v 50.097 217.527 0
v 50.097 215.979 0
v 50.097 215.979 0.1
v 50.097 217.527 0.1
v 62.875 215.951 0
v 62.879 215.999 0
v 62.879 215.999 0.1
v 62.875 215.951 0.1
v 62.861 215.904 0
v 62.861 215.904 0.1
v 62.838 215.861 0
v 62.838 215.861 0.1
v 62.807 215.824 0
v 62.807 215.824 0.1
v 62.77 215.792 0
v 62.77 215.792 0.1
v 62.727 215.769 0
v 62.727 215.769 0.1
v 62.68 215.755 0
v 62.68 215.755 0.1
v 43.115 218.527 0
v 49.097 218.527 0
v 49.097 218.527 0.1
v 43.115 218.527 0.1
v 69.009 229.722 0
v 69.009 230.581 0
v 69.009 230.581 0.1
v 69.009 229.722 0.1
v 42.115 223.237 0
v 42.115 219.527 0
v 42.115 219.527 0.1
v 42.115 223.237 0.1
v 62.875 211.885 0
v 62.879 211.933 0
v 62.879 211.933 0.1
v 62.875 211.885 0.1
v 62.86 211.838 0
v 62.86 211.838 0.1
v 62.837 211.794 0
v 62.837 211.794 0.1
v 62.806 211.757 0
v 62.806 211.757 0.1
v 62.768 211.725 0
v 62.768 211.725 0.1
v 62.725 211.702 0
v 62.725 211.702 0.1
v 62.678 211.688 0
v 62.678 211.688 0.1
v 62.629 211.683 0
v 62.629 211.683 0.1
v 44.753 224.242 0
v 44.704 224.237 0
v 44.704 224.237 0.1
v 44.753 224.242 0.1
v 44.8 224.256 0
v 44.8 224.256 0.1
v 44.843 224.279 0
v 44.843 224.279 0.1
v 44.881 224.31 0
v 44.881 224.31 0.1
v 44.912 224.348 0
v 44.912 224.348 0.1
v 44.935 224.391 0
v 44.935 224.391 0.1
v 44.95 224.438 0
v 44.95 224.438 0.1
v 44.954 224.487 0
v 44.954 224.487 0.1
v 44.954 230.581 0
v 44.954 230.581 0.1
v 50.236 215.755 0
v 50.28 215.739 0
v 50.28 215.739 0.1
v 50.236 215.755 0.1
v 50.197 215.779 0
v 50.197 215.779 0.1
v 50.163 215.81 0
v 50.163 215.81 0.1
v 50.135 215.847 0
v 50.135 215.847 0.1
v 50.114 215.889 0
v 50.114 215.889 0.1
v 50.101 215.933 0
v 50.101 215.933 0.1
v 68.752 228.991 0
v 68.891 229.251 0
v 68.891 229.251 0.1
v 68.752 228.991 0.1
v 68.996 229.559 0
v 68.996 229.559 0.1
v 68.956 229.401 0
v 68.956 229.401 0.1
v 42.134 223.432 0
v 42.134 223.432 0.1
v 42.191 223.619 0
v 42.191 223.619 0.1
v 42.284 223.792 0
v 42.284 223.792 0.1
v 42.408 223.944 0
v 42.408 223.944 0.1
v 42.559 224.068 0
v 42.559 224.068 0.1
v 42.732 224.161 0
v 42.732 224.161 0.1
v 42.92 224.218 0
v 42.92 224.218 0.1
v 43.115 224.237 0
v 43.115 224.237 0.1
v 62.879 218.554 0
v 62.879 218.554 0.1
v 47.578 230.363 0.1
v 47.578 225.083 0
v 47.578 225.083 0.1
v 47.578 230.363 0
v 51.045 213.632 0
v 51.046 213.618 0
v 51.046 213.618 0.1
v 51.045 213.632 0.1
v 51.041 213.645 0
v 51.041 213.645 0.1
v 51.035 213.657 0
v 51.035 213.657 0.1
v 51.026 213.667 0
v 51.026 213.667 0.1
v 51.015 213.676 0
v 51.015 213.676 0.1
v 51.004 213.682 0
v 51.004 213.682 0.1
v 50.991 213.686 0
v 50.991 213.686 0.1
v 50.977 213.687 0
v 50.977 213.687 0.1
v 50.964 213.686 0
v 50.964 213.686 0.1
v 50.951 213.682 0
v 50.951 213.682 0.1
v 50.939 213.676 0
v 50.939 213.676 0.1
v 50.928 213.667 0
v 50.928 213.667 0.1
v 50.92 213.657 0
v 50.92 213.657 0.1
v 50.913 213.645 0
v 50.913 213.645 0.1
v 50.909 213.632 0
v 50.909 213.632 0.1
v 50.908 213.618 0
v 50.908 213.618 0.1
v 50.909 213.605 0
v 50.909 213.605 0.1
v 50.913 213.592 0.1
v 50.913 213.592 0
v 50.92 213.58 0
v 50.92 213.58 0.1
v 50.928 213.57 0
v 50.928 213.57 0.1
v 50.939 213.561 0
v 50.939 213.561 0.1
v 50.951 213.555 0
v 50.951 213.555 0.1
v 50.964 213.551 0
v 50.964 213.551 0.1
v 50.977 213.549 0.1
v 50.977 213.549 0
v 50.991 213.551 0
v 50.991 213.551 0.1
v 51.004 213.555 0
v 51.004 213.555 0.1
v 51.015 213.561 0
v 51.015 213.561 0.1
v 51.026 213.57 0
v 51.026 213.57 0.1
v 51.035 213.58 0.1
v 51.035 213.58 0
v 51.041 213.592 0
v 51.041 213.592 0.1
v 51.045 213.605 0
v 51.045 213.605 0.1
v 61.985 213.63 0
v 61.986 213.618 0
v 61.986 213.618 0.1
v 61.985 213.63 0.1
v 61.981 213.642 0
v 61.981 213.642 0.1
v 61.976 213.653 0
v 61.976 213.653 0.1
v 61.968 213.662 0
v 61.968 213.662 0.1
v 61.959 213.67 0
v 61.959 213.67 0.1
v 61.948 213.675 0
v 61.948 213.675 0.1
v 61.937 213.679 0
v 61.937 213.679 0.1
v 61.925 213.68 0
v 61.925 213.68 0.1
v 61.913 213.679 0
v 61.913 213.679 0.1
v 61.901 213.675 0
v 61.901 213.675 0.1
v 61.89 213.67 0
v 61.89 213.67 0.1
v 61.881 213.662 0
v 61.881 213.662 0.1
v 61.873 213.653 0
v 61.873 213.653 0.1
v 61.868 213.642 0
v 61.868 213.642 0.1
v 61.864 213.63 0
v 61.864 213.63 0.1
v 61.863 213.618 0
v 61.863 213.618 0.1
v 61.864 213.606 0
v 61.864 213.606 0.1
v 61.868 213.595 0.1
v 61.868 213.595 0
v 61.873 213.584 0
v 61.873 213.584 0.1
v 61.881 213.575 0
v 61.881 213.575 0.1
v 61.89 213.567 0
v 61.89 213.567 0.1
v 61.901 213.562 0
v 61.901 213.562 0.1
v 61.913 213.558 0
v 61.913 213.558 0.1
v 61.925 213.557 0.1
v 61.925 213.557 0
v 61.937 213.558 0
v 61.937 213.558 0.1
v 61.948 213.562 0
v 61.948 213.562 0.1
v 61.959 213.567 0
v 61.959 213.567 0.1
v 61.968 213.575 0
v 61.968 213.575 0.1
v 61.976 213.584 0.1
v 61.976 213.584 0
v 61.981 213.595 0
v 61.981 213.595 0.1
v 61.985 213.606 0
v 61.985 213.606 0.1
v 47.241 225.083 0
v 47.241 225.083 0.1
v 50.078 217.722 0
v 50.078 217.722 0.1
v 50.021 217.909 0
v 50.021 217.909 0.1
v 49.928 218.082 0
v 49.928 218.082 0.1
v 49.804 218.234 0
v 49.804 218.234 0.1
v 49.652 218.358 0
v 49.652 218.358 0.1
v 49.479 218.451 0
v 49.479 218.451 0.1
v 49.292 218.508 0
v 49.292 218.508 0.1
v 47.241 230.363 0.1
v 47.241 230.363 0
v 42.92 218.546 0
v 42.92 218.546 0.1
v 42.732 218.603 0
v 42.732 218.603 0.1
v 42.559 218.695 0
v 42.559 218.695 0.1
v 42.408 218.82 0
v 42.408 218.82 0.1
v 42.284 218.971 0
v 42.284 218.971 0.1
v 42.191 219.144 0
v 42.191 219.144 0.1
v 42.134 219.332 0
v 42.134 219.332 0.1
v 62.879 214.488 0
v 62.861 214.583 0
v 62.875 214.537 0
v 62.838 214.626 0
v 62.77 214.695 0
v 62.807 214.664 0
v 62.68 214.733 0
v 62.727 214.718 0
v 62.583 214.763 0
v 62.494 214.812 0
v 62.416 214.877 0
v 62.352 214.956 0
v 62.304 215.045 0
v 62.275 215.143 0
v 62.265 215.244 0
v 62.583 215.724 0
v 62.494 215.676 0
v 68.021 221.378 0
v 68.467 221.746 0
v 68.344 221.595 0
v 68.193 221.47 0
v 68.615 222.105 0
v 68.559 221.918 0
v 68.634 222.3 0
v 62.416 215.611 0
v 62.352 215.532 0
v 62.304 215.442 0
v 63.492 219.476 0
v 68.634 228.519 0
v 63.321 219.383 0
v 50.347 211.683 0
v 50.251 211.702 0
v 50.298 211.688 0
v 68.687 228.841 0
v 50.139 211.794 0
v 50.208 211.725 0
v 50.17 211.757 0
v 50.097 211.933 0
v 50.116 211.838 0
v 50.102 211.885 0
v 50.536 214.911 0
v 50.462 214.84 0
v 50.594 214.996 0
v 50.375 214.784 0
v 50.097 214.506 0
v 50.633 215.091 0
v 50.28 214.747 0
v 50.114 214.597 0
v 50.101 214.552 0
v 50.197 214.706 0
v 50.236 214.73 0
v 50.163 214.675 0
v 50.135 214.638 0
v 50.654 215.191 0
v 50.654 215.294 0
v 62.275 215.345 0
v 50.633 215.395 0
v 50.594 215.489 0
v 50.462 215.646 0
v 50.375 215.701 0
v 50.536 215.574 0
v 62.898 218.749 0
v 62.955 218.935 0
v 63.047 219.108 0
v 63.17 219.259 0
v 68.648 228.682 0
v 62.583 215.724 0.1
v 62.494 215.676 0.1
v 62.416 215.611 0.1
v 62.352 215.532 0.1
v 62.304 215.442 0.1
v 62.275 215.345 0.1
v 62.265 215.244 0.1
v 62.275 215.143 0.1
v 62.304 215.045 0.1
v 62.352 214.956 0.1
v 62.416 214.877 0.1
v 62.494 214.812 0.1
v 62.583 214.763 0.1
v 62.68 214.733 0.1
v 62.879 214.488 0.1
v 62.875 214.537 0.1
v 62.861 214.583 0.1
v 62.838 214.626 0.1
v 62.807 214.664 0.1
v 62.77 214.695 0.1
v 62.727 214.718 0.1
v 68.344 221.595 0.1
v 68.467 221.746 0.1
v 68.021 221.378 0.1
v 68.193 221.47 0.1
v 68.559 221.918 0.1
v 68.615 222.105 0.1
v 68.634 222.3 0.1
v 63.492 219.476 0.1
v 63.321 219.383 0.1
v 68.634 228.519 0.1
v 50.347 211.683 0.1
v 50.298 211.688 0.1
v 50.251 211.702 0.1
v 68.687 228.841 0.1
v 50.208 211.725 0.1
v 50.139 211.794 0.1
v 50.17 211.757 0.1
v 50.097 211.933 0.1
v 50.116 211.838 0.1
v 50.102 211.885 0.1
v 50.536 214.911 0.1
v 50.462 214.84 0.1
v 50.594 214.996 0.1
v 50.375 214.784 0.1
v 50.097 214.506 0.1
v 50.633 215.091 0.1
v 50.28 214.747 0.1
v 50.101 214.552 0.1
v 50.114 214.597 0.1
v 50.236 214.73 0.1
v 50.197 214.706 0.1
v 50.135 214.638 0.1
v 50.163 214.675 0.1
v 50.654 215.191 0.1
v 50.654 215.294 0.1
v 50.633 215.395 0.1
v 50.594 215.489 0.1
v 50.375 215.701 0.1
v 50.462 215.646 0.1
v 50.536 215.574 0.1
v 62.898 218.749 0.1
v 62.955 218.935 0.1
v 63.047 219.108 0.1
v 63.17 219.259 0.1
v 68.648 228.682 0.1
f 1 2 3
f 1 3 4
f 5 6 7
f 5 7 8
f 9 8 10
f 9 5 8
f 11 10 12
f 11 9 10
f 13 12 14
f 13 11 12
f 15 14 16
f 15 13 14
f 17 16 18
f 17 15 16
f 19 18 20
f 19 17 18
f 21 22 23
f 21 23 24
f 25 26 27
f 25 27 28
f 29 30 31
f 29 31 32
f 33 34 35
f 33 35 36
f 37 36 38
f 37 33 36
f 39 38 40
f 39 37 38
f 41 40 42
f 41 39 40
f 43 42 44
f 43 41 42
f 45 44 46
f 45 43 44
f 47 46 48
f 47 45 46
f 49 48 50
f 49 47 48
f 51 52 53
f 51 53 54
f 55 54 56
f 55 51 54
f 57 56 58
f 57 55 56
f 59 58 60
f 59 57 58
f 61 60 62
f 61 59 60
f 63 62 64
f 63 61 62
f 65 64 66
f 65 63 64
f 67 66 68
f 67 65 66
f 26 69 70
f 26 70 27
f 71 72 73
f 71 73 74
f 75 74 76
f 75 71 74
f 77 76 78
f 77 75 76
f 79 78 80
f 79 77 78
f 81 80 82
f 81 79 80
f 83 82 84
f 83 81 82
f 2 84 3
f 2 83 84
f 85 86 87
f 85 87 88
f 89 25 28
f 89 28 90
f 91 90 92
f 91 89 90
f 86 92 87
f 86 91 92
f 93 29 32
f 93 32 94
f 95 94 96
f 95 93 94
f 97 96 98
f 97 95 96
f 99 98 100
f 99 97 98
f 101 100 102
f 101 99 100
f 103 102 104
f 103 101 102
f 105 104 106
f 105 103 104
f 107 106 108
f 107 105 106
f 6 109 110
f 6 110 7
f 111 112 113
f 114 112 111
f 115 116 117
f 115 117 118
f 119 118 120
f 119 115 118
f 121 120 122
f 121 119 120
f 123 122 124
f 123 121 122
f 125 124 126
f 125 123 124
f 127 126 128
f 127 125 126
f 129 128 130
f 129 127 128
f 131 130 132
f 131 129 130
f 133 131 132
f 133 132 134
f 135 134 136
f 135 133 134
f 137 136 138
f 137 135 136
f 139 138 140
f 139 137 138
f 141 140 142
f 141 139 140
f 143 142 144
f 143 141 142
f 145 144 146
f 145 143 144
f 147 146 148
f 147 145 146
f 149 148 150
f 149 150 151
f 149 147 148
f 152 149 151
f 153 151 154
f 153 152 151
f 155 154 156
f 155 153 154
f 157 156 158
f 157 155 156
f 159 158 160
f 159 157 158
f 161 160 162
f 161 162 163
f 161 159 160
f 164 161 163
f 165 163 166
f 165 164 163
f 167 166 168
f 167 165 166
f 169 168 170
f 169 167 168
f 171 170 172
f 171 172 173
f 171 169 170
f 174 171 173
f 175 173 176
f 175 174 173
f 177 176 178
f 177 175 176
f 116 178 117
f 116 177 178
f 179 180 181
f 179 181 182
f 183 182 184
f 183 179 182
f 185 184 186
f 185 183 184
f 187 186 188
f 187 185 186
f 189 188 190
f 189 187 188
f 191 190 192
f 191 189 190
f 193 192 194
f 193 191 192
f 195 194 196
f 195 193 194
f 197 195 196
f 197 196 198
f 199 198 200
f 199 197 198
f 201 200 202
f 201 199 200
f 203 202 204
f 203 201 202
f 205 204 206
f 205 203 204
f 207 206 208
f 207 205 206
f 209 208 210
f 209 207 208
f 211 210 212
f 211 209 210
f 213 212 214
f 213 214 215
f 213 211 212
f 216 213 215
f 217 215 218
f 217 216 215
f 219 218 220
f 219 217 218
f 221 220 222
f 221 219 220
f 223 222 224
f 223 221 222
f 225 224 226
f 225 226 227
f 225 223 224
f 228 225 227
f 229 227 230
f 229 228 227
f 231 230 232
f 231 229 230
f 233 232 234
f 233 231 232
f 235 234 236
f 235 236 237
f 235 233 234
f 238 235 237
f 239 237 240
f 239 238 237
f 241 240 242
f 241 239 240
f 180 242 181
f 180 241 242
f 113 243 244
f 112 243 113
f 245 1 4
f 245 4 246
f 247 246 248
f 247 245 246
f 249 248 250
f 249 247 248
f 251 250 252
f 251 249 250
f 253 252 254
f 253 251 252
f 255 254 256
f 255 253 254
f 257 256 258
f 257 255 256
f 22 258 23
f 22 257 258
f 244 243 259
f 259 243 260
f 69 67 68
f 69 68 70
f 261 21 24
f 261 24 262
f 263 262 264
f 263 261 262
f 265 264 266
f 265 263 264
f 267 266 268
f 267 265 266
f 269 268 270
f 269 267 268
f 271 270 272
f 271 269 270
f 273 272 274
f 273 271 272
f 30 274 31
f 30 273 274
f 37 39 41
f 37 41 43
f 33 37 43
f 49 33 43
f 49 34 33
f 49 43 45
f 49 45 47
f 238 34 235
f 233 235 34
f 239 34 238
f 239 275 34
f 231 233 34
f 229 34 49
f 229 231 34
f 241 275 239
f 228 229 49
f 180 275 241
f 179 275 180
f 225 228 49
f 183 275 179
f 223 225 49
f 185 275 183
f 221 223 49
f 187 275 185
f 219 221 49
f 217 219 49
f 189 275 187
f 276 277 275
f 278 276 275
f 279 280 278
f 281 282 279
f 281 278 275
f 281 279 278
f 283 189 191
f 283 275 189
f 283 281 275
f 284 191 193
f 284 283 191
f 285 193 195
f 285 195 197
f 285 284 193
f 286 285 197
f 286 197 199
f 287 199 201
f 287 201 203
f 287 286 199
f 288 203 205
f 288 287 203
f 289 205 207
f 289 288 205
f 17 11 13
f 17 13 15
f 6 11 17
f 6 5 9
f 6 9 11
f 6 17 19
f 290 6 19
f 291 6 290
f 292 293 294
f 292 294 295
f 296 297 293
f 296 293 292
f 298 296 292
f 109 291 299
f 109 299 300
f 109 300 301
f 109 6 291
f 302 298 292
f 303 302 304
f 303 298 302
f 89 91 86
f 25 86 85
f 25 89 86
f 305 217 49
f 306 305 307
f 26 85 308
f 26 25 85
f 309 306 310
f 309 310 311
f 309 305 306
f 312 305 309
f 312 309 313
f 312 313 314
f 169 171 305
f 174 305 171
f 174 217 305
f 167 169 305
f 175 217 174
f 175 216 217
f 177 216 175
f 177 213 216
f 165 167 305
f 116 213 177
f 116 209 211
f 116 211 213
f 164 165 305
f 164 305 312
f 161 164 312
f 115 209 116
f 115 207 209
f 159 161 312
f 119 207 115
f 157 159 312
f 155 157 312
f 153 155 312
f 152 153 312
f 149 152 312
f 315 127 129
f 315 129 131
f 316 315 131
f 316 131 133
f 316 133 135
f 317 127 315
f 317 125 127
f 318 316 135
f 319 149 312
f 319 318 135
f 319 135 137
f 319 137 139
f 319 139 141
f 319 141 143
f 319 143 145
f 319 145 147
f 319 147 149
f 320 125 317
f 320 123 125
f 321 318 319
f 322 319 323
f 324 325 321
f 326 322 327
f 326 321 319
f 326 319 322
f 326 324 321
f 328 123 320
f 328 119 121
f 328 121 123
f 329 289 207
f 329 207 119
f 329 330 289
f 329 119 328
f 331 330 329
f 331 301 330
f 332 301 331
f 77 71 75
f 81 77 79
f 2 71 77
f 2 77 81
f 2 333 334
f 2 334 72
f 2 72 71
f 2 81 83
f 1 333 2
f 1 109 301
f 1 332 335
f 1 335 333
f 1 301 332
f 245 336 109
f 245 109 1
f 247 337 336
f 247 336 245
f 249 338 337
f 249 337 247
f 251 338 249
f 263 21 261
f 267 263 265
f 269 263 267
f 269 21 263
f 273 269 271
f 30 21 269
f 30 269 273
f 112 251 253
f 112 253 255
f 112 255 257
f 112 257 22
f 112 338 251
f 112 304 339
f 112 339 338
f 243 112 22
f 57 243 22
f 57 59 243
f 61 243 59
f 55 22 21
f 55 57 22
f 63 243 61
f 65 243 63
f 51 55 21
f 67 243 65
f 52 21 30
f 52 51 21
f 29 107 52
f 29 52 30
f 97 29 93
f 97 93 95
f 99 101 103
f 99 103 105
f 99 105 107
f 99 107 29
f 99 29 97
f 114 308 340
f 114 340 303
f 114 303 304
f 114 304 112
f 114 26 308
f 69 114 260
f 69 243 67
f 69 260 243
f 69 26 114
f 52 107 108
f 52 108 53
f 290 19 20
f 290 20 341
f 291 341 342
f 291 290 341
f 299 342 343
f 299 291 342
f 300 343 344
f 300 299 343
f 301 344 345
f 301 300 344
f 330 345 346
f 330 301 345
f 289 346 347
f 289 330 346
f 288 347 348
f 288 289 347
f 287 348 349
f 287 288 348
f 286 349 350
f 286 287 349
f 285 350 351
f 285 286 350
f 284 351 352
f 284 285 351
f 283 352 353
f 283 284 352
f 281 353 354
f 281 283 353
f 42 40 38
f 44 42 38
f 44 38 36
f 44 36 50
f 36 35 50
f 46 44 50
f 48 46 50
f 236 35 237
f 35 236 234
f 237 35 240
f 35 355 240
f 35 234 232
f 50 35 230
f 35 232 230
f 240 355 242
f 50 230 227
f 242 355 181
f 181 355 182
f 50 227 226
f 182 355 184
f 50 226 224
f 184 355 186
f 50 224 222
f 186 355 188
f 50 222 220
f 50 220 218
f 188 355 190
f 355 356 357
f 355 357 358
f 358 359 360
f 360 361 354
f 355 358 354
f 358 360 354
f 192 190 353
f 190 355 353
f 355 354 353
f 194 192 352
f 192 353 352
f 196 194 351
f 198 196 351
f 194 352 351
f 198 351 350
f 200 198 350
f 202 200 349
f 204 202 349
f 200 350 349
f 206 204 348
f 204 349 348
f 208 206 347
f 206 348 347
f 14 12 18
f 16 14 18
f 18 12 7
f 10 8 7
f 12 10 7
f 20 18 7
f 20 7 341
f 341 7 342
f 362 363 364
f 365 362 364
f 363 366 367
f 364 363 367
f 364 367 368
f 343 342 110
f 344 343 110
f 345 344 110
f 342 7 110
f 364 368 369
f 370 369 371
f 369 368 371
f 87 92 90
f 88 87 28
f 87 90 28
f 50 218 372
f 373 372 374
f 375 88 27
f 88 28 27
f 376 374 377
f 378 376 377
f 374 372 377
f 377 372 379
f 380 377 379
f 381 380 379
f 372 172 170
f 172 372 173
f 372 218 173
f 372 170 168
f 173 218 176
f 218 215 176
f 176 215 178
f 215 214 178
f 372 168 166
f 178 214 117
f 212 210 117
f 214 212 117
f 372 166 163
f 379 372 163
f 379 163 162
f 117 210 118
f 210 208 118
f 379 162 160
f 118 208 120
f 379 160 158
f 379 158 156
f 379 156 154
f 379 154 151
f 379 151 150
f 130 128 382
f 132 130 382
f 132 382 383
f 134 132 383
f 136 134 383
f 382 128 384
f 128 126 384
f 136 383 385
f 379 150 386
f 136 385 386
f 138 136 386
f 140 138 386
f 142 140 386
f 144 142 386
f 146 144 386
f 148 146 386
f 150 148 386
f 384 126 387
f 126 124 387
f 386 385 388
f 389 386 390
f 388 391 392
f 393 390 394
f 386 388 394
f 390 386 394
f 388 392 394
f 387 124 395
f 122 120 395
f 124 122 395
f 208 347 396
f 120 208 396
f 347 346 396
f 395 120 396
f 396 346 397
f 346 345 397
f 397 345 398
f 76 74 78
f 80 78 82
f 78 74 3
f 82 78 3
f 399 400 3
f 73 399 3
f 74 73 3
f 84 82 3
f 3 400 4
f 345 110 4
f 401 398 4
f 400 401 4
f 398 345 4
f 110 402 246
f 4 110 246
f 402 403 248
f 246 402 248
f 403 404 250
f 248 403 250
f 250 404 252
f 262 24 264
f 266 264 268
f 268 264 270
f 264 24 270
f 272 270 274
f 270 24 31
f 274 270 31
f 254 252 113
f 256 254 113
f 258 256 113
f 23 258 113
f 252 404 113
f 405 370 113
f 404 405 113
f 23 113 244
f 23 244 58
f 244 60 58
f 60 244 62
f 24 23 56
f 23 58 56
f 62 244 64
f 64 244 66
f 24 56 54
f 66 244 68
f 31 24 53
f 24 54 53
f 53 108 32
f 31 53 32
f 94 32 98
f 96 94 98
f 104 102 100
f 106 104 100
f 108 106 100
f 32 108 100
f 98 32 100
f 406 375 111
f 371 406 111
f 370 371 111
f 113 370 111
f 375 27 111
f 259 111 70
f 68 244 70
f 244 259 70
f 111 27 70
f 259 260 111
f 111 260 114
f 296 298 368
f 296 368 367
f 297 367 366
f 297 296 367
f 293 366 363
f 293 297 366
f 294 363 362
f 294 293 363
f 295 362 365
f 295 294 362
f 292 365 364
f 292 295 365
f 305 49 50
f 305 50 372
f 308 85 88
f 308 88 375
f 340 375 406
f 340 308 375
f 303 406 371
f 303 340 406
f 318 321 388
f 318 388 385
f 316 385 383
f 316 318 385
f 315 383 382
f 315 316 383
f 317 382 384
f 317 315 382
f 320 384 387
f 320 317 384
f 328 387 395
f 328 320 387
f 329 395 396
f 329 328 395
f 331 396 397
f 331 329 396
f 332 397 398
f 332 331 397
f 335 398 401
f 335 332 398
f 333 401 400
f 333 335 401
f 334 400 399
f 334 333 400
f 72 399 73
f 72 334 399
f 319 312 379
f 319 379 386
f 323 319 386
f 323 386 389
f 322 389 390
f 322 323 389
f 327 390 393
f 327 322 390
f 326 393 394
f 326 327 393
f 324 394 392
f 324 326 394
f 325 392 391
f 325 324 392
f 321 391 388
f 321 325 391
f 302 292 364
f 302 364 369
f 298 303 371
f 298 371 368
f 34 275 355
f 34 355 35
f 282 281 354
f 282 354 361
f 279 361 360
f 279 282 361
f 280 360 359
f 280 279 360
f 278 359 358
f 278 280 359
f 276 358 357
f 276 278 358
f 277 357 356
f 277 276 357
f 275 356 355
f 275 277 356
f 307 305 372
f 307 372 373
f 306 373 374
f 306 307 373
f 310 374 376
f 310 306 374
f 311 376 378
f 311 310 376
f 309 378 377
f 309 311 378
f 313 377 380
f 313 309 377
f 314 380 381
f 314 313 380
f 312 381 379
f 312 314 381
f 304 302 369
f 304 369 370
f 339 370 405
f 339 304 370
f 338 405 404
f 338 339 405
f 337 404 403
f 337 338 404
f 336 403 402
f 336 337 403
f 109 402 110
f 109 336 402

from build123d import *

# Parameters (mm, degrees)
ESQUISSE1_R        = 0.068980455
ESQUISSE1_R_2      = 0.06150295
ESQUISSE1_W        = 0.337022694
ESQUISSE1_H        = 5.280022209
BOSS_EXTRU_1_DEPTH = 0.1


with BuildPart() as part:
    # Esquisse1 → Boss.-Extru.1 (new body)
    with BuildSketch(Plane.XY):
        with BuildLine():
            Line((69.009405392, 230.580792913), (69.009405392, 229.722196339))
            ThreePointArc((69.009405392, 229.722196339), (68.979401433, 229.479075631), (68.891190034, 229.250544089))
            Line((68.891190034, 229.250544089), (68.752437477, 228.991137135))
            ThreePointArc((68.752437477, 228.991137135), (68.664226077, 228.762605593), (68.634222119, 228.519484885))
            Line((68.634222119, 228.519484885), (68.634222119, 222.299593089))
            ThreePointArc((68.634222119, 222.299593089), (68.467011491, 221.746003113), (68.021298395, 221.377545392))
            Line((68.021298395, 221.377545392), (63.492336438, 219.476283954))
            ThreePointArc((63.492336438, 219.476283954), (63.046623342, 219.107826233), (62.879412715, 218.554236256))
            Line((62.879412715, 218.554236256), (62.879412715, 215.999425613))
            ThreePointArc((62.879412715, 215.999425613), (62.823397918, 215.841724183), (62.680454788, 215.754691662))
            ThreePointArc((62.680454788, 215.754691662), (62.265082422, 215.243750871), (62.680454788, 214.732810081))
            ThreePointArc((62.680454788, 214.732810081), (62.823397918, 214.645777559), (62.879412715, 214.48807613))
            Line((62.879412715, 214.48807613), (62.879412715, 211.933337892))
            ThreePointArc((62.879412715, 211.933337892), (62.80618941, 211.756561196), (62.629412715, 211.683337892))
            Line((62.629412715, 211.683337892), (50.34681626, 211.683337892))
            ThreePointArc((50.34681626, 211.683337892), (50.170039564, 211.756561196), (50.09681626, 211.933337892))
            Line((50.09681626, 211.933337892), (50.09681626, 214.506095719))
            ThreePointArc((50.09681626, 214.506095719), (50.14774452, 214.657325486), (50.2797798, 214.746940302))
            ThreePointArc((50.2797798, 214.746940302), (50.65644704, 215.242767306), (50.2797798, 215.73859431))
            ThreePointArc((50.2797798, 215.73859431), (50.14774452, 215.828209125), (50.09681626, 215.979438893))
            Line((50.09681626, 215.979438893), (50.09681626, 217.526780439))
            ThreePointArc((50.09681626, 217.526780439), (49.803923041, 218.233887221), (49.09681626, 218.526780439))
            Line((49.09681626, 218.526780439), (43.115034211, 218.526780439))
            ThreePointArc((43.115034211, 218.526780439), (42.40792743, 218.819673658), (42.115034211, 219.526780439))
            Line((42.115034211, 219.526780439), (42.115034211, 223.236736654))
            ThreePointArc((42.115034211, 223.236736654), (42.40792743, 223.943843435), (43.115034211, 224.236736654))
            Line((43.115034211, 224.236736654), (44.704420557, 224.236736654))
            ThreePointArc((44.704420557, 224.236736654), (44.881197252, 224.309959959), (44.954420557, 224.486736654))
            Line((44.954420557, 224.486736654), (44.954420557, 230.580792913))
            Line((44.954420557, 230.580792913), (69.009405392, 230.580792913))
        make_face()
        with Locations((50.977150622, 213.618363216)):
            Circle(ESQUISSE1_R, mode=Mode.SUBTRACT)
        with Locations((61.924613366, 213.618363216)):
            Circle(ESQUISSE1_R_2, mode=Mode.SUBTRACT)
        with Locations((47.409826256, 227.722685683)):
            Rectangle(ESQUISSE1_W, ESQUISSE1_H, mode=Mode.SUBTRACT)
    extrude(amount=BOSS_EXTRU_1_DEPTH)


solid = part.part
